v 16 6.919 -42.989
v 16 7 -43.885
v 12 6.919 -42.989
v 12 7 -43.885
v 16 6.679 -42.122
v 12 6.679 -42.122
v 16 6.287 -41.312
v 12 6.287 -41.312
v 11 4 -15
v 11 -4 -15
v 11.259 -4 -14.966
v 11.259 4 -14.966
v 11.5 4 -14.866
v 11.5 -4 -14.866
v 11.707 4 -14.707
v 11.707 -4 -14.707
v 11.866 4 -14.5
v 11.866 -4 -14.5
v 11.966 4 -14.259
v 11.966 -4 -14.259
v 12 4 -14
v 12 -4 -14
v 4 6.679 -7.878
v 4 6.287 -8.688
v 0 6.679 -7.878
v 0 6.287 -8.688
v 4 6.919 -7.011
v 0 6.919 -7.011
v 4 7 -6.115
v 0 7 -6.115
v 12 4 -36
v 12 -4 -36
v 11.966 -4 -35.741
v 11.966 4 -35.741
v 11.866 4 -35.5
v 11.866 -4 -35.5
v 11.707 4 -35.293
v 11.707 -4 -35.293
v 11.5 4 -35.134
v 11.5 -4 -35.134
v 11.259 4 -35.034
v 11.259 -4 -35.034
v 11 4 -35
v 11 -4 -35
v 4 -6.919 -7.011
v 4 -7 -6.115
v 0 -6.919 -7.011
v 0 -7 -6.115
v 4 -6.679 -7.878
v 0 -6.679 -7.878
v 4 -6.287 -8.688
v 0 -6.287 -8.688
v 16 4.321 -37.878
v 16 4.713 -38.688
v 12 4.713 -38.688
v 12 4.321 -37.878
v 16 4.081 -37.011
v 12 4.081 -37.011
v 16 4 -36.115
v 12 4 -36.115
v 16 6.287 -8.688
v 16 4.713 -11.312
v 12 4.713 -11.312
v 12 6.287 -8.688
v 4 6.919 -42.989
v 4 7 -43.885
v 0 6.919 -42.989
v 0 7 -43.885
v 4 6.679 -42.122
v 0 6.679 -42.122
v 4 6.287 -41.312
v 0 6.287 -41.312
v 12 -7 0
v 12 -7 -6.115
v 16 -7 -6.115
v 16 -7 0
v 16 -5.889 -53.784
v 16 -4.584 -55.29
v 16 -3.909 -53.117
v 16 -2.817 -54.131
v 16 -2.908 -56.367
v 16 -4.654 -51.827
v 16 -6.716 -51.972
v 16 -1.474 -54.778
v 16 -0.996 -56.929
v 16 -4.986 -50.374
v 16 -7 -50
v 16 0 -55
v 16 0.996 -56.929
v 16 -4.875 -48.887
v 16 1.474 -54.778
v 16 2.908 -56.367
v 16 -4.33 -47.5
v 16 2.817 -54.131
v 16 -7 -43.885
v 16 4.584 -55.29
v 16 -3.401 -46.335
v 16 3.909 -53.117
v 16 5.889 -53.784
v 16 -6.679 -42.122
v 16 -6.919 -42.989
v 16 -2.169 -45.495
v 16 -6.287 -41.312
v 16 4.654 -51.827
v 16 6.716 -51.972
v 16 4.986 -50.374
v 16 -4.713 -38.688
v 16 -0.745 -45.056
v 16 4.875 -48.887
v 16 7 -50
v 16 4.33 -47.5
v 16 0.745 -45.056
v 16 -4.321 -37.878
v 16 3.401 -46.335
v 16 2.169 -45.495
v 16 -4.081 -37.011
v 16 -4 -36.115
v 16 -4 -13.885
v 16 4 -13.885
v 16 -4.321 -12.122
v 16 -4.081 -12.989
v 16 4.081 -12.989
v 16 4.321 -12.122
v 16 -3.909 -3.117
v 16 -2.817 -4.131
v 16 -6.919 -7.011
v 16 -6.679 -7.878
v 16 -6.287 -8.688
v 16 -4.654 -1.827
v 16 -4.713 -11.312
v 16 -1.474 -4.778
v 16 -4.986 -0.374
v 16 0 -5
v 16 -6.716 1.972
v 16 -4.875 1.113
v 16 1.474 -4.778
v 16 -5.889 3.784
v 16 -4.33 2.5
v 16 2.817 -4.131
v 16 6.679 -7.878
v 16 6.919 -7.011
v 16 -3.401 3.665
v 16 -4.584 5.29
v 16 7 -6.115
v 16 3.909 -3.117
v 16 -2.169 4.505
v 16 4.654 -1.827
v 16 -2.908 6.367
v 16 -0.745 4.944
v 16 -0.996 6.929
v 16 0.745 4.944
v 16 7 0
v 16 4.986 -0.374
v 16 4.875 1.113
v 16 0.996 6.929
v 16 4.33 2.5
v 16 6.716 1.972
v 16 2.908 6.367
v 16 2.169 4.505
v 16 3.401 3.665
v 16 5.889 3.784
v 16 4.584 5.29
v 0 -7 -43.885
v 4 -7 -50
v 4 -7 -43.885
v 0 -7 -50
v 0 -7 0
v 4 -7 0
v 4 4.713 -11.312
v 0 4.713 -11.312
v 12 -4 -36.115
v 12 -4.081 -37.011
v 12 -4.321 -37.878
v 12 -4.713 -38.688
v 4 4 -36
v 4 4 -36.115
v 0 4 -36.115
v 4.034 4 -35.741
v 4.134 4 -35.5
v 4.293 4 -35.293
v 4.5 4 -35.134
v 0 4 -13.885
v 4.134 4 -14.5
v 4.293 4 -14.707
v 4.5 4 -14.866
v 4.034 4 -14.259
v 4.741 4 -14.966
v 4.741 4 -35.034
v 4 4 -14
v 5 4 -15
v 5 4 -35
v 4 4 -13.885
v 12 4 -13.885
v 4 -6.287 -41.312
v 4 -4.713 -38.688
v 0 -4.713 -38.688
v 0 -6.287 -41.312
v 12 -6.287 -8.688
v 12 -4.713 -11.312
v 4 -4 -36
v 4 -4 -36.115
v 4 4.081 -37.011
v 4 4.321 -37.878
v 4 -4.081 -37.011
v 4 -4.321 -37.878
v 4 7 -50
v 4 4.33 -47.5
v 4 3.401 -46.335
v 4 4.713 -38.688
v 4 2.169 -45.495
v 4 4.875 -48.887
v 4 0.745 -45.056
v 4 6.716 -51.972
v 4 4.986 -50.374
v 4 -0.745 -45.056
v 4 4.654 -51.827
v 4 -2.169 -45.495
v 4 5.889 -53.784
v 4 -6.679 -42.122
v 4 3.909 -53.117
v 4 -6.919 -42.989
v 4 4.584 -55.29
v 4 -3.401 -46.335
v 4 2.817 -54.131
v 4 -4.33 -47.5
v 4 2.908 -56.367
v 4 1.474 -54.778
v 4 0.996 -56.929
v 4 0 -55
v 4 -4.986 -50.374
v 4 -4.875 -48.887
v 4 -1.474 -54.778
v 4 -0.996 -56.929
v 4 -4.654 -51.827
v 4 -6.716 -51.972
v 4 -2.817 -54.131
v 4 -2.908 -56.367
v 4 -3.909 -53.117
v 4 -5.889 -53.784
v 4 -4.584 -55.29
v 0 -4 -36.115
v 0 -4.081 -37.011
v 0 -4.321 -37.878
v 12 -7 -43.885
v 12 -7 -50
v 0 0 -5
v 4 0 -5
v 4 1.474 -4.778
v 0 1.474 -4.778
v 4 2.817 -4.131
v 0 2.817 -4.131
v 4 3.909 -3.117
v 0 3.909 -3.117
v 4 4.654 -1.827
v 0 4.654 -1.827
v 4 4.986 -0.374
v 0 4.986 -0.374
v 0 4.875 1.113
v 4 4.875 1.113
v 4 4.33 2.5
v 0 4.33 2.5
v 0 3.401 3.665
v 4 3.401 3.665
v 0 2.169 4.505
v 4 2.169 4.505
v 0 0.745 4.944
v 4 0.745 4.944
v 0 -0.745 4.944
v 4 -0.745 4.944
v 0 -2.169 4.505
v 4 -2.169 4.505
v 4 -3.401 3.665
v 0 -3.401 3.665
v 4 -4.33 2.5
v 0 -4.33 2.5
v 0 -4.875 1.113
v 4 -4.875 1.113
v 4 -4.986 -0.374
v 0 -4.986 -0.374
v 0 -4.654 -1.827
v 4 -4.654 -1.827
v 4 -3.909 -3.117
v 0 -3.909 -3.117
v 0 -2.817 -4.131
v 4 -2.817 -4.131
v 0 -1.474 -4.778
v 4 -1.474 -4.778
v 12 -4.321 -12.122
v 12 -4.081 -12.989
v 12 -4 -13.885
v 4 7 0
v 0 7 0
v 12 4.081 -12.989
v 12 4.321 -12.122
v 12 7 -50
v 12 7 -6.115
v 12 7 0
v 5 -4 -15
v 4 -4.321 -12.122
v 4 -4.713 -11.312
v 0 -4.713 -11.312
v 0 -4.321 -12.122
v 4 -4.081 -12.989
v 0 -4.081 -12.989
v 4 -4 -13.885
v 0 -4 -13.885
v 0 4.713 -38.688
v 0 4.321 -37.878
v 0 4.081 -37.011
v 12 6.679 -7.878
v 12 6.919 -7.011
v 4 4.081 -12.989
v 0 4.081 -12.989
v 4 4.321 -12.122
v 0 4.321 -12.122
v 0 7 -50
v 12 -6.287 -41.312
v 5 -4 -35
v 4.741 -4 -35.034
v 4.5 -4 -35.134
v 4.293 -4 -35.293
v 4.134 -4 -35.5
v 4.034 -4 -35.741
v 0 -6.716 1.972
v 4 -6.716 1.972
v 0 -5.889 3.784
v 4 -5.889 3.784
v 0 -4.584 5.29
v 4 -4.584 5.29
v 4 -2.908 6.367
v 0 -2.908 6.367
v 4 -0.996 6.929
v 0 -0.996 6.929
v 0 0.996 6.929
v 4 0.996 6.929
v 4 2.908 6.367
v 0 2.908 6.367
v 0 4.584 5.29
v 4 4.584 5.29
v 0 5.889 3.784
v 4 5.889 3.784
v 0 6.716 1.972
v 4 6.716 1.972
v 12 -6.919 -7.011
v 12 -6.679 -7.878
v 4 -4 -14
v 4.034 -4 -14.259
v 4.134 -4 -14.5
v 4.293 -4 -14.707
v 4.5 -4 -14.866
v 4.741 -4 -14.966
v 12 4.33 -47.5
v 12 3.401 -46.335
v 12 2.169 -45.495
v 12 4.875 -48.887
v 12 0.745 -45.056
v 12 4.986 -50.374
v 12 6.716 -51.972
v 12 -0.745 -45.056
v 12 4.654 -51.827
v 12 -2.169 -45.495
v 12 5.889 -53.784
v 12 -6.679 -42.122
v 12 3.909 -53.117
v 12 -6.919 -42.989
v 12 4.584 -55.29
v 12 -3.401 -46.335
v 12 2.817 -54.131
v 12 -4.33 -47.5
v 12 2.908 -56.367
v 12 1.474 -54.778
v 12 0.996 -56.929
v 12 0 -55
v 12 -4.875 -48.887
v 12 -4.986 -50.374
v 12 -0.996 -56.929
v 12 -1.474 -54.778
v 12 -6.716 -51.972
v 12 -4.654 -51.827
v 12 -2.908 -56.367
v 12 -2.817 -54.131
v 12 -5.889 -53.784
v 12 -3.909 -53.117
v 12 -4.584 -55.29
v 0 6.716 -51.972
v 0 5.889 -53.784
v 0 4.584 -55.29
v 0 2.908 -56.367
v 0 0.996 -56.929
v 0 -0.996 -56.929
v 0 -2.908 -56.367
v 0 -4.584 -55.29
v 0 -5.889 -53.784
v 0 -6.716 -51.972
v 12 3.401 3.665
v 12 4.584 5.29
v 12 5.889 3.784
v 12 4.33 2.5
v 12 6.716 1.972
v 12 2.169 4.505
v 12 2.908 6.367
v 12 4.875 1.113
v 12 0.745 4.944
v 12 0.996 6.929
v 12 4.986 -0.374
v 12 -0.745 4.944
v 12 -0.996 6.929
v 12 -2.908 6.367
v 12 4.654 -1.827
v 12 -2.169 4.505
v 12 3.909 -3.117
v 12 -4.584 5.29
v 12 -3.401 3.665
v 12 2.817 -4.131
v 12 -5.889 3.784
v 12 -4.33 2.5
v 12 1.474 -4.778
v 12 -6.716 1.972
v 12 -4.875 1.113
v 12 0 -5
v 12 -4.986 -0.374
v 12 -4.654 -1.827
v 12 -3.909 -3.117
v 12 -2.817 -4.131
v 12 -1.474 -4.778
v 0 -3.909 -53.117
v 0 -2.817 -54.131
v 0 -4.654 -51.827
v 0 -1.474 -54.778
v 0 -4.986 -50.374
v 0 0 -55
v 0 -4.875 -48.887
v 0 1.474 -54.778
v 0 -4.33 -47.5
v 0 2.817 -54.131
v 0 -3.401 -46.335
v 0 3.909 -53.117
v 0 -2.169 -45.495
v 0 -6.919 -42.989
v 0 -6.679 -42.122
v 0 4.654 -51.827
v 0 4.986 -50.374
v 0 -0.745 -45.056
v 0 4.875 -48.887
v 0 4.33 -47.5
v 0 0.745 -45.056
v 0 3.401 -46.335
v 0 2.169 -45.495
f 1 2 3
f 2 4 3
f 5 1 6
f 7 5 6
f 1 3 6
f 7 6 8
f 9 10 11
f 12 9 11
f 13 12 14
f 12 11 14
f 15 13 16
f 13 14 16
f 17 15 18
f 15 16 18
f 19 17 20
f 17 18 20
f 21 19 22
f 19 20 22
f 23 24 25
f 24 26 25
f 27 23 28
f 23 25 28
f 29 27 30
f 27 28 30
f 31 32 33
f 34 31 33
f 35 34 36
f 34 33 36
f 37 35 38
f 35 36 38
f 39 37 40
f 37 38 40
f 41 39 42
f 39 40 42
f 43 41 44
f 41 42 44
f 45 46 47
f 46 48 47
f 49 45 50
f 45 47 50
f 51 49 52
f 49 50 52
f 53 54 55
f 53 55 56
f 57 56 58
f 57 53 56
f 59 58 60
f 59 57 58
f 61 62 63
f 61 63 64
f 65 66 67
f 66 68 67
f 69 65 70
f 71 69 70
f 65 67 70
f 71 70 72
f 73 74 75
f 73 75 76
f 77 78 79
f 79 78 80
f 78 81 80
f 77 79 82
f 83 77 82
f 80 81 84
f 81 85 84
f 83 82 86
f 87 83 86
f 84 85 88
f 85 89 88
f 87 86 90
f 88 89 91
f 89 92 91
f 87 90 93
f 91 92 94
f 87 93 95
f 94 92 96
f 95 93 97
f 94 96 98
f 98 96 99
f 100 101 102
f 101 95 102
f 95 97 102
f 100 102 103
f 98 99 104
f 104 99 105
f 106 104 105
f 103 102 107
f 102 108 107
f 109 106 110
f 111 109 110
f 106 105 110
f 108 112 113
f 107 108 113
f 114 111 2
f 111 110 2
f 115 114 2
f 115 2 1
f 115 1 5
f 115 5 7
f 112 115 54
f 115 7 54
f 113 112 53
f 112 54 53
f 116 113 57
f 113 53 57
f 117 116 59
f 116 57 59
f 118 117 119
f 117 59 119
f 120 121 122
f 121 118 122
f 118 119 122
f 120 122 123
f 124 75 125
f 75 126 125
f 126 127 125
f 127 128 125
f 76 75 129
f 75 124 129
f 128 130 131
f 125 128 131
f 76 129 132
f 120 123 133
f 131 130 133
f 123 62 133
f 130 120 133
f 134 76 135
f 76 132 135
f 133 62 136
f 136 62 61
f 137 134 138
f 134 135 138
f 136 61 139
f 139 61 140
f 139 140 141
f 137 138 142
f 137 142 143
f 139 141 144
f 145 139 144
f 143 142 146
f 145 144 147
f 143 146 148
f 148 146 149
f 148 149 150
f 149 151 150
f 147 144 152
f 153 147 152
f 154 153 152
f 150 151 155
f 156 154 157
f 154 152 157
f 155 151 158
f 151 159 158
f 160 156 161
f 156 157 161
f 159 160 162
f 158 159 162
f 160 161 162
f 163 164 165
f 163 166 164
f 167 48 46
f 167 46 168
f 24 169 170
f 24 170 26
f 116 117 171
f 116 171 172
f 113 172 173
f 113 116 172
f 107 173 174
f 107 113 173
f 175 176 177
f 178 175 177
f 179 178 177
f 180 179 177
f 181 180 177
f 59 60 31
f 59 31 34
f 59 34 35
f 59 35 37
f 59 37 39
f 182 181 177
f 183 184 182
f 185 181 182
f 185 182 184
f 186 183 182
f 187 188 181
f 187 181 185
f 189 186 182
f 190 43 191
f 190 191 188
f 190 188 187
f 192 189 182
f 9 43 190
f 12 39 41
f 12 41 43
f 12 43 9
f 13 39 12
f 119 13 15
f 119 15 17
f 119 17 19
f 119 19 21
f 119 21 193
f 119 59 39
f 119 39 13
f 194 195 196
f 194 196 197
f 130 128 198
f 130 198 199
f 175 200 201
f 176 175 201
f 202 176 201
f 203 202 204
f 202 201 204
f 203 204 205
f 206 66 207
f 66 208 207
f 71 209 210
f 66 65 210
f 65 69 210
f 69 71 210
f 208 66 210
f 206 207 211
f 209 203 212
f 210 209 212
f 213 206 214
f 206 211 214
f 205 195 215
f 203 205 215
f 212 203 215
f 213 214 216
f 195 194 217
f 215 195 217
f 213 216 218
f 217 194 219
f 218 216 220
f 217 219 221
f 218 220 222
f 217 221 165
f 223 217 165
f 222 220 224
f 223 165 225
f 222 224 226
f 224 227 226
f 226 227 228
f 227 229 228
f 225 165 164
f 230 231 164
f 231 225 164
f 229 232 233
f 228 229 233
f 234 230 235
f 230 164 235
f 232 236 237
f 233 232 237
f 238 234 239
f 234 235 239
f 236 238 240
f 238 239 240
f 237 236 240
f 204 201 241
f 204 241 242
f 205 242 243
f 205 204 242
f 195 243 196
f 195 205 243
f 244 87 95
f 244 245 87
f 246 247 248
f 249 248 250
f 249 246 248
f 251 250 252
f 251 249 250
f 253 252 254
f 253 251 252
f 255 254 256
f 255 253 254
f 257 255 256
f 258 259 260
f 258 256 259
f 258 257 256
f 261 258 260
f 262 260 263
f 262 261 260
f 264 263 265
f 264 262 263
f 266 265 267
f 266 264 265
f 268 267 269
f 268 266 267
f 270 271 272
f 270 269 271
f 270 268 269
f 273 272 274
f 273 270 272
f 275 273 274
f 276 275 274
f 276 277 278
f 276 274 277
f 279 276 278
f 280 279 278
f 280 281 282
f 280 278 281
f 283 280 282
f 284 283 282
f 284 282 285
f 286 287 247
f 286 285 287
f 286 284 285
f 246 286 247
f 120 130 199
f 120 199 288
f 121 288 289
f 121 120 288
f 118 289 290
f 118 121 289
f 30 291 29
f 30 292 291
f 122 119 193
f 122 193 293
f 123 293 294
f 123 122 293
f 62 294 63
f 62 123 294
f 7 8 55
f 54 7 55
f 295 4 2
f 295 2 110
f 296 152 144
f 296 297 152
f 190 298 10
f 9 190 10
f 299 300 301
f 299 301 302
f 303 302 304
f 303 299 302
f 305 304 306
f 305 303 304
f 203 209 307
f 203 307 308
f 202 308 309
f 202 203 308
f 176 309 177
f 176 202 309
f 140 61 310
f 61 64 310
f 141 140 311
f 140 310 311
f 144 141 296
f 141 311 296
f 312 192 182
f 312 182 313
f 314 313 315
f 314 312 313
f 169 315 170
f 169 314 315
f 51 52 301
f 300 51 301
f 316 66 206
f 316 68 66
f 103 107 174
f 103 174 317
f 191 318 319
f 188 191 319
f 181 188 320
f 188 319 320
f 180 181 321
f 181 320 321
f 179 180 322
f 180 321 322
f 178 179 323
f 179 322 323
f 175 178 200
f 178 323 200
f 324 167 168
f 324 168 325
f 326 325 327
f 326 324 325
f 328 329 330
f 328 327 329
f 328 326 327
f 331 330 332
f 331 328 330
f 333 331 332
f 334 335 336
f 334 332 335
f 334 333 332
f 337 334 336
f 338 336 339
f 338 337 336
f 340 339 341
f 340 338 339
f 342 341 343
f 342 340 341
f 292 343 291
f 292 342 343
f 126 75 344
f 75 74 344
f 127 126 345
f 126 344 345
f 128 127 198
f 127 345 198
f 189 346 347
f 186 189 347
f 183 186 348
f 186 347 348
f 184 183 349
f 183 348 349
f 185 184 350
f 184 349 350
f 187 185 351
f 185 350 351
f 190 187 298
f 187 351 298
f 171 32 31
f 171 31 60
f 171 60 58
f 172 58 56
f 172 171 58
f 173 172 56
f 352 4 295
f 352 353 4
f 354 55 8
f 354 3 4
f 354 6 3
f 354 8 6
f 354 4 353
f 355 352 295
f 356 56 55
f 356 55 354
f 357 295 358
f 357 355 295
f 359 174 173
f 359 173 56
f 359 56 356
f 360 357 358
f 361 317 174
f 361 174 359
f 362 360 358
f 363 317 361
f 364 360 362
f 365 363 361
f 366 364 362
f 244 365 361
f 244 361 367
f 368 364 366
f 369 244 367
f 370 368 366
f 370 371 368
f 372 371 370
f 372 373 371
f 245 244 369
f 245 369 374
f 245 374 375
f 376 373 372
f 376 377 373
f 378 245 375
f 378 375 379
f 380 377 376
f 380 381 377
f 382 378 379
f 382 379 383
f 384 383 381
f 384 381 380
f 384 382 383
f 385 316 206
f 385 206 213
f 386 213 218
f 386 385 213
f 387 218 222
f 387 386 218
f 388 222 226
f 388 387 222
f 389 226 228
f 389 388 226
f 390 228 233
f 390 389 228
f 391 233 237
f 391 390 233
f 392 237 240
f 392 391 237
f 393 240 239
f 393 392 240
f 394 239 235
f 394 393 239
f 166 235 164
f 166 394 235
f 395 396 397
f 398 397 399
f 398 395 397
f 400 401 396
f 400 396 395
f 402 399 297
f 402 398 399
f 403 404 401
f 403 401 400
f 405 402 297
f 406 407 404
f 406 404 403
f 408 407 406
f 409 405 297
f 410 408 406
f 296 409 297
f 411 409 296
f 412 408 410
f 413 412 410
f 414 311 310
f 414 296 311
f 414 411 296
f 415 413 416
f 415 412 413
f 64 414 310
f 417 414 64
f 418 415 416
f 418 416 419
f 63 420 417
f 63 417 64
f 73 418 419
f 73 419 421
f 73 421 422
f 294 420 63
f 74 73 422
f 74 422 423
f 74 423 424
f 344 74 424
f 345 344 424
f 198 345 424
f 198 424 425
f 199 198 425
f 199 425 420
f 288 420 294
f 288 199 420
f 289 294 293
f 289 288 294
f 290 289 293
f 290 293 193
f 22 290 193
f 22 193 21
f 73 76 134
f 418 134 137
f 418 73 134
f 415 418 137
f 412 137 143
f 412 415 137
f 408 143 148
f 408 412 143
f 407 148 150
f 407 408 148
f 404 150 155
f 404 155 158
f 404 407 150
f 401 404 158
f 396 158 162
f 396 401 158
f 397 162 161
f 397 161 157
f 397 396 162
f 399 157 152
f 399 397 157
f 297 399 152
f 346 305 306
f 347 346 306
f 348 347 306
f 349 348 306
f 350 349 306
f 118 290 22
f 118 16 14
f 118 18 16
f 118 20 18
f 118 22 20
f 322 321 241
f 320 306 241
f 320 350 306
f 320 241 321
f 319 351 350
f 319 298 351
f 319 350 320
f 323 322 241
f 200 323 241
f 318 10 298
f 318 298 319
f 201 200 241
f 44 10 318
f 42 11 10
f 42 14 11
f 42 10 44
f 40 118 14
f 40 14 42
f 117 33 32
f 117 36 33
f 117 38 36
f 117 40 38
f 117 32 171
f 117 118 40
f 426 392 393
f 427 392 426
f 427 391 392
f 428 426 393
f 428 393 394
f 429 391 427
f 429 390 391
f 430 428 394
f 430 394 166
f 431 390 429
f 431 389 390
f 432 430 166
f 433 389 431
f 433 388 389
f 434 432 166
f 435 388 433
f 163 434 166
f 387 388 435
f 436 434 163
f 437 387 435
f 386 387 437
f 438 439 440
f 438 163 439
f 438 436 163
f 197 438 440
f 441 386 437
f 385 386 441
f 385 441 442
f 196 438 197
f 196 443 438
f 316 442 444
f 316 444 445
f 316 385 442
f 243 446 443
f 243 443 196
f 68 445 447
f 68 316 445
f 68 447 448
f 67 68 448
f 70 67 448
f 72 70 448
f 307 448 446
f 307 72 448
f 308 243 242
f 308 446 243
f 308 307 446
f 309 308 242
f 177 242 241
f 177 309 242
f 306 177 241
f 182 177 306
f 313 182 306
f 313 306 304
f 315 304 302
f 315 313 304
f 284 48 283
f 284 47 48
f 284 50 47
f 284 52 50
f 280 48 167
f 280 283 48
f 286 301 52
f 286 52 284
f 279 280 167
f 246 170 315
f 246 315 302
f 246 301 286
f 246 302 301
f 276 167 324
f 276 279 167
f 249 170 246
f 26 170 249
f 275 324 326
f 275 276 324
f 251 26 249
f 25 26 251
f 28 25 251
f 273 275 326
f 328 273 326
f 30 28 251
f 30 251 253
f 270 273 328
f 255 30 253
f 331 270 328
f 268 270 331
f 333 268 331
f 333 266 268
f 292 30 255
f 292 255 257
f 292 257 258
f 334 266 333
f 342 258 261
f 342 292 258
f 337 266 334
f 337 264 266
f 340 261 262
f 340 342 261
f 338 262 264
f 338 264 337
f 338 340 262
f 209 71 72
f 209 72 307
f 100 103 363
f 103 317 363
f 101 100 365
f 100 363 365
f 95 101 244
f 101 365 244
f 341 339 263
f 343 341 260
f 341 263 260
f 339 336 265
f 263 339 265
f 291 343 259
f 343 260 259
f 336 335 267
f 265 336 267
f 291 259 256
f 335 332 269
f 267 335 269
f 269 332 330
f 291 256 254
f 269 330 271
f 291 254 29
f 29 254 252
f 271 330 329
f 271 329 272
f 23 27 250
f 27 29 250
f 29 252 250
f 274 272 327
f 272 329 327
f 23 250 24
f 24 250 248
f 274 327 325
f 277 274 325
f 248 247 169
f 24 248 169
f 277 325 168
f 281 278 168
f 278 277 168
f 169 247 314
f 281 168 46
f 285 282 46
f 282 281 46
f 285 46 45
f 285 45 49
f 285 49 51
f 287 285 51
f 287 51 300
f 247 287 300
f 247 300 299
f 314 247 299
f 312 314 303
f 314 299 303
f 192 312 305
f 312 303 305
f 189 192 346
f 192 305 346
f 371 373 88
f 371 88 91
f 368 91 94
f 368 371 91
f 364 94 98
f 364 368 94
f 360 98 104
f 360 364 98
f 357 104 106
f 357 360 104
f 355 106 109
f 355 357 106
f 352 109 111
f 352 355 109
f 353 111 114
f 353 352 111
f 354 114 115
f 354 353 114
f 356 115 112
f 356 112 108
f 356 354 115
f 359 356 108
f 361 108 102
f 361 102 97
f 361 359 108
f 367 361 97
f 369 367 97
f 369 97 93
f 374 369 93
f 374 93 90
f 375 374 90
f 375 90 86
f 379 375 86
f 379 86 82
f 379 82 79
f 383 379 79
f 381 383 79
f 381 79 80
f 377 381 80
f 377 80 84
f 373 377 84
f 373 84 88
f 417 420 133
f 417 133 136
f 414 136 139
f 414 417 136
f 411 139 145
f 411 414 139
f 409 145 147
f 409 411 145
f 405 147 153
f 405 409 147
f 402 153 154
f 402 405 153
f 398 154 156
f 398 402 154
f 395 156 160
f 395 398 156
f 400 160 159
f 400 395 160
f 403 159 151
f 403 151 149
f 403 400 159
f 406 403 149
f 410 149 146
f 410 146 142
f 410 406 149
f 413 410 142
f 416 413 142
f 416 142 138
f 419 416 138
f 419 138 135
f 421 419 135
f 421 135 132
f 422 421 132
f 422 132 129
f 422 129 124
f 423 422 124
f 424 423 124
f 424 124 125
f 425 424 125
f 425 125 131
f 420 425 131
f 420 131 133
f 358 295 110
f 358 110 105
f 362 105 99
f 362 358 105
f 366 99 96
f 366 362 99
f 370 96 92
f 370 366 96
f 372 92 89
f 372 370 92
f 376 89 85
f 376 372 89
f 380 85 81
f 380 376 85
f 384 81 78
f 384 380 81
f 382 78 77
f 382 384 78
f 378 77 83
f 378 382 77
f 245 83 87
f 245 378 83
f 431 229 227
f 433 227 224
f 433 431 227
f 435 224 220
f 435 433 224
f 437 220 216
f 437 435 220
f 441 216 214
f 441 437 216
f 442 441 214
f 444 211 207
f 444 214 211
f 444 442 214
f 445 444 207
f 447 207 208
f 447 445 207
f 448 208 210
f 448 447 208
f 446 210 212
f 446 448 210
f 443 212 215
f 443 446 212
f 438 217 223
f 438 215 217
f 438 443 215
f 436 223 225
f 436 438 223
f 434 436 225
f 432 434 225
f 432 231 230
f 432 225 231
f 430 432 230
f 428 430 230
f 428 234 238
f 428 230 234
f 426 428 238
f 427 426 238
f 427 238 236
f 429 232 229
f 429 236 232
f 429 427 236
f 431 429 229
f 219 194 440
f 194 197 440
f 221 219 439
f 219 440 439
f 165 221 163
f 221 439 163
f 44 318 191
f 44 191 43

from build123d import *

# Parameters (mm, degrees)
SKETCH1_R               = 5
BOSS_EXTRUDE1_DEPTH     = 16
SKETCH2_W               = 8
SKETCH2_H               = 22
CUT_EXTRUDE1_DEPTH      = 8
CUT_EXTRUDE1_DEPTH_BACK = 8
FILLET1_R               = 1
CUT_EXTRUDE2_DEPTH      = 17
FILLET2_R               = 5


with BuildPart() as part:
    # Sketch1 → Boss-Extrude1 (new body)
    with BuildSketch(Plane(origin=(0, 0, 0), x_dir=(0, 0, -1), z_dir=(1, 0, 0))):
        with BuildLine():
            Line((0, 7), (50, 7))
            ThreePointArc((50, 7), (57, 0), (50, -7))
            Line((50, -7), (0, -7))
            ThreePointArc((0, -7), (-7, 0), (0, 7))
        make_face()
        Circle(SKETCH1_R, mode=Mode.SUBTRACT)
        with Locations((50, 0)):
            Circle(SKETCH1_R, mode=Mode.SUBTRACT)
    extrude(amount=BOSS_EXTRUDE1_DEPTH)

    # Sketch2 → Cut-Extrude1 (cut, two sides)
    with BuildSketch(Plane(origin=(0, 0, 0), x_dir=(1, 0, 0), z_dir=(0, 1, 0))) as cut_extrude1_sk:
        with Locations((8, 4)):
            Rectangle(SKETCH2_W, SKETCH2_H)
        with Locations((8, 46)):
            Rectangle(SKETCH2_W, SKETCH2_H)
    extrude(amount=CUT_EXTRUDE1_DEPTH, mode=Mode.SUBTRACT)
    extrude(cut_extrude1_sk.sketch, amount=-CUT_EXTRUDE1_DEPTH_BACK, mode=Mode.SUBTRACT)

    # Fillet1
    fillet1_edges = [part.edges().sort_by_distance(p)[0] for p in [
        (12, 0, -15),
        (4, 0, -15),
        (4, 0, -35),
        (12, 0, -35),
    ]]
    fillet(fillet1_edges, radius=FILLET1_R)

    # Sketch3 → Cut-Extrude2 (cut, through all)
    with BuildSketch(Plane(origin=(16, 0, 0), x_dir=(0, 0, -1), z_dir=(1, 0, 0))):
        with BuildLine():
            Line((13.884919825, -4), (36.115080175, -4))
            ThreePointArc((36.115080175, -4), (37.449748085, -4.181425359), (38.687558952, -4.712535371))
            Line((38.687558952, -4.712535371), (42.5, -7))
            Line((42.5, -7), (7.5, -7))
            Line((7.5, -7), (11.312441048, -4.712535371))
            ThreePointArc((11.312441048, -4.712535371), (12.550251915, -4.181425359), (13.884919825, -4))
        make_face()
        with BuildLine():
            Line((11.312441048, 4.712535371), (7.5, 7))
            Line((7.5, 7), (42.5, 7))
            Line((42.5, 7), (38.687558952, 4.712535371))
            ThreePointArc((38.687558952, 4.712535371), (37.449748085, 4.181425359), (36.115080175, 4))
            Line((36.115080175, 4), (13.884919825, 4))
            ThreePointArc((13.884919825, 4), (12.550251915, 4.181425359), (11.312441048, 4.712535371))
        make_face()
    extrude(amount=-CUT_EXTRUDE2_DEPTH, mode=Mode.SUBTRACT)

    # Fillet2
    fillet2_edges = [part.edges().sort_by_distance(p)[0] for p in [
        (2, -7, -7.5),
        (14, -7, -7.5),
        (14, -7, -42.5),
        (2, -7, -42.5),
        (2, 7, -42.5),
        (14, 7, -42.5),
        (2, 7, -7.5),
        (14, 7, -7.5),
    ]]
    fillet(fillet2_edges, radius=FILLET2_R)


solid = part.part
